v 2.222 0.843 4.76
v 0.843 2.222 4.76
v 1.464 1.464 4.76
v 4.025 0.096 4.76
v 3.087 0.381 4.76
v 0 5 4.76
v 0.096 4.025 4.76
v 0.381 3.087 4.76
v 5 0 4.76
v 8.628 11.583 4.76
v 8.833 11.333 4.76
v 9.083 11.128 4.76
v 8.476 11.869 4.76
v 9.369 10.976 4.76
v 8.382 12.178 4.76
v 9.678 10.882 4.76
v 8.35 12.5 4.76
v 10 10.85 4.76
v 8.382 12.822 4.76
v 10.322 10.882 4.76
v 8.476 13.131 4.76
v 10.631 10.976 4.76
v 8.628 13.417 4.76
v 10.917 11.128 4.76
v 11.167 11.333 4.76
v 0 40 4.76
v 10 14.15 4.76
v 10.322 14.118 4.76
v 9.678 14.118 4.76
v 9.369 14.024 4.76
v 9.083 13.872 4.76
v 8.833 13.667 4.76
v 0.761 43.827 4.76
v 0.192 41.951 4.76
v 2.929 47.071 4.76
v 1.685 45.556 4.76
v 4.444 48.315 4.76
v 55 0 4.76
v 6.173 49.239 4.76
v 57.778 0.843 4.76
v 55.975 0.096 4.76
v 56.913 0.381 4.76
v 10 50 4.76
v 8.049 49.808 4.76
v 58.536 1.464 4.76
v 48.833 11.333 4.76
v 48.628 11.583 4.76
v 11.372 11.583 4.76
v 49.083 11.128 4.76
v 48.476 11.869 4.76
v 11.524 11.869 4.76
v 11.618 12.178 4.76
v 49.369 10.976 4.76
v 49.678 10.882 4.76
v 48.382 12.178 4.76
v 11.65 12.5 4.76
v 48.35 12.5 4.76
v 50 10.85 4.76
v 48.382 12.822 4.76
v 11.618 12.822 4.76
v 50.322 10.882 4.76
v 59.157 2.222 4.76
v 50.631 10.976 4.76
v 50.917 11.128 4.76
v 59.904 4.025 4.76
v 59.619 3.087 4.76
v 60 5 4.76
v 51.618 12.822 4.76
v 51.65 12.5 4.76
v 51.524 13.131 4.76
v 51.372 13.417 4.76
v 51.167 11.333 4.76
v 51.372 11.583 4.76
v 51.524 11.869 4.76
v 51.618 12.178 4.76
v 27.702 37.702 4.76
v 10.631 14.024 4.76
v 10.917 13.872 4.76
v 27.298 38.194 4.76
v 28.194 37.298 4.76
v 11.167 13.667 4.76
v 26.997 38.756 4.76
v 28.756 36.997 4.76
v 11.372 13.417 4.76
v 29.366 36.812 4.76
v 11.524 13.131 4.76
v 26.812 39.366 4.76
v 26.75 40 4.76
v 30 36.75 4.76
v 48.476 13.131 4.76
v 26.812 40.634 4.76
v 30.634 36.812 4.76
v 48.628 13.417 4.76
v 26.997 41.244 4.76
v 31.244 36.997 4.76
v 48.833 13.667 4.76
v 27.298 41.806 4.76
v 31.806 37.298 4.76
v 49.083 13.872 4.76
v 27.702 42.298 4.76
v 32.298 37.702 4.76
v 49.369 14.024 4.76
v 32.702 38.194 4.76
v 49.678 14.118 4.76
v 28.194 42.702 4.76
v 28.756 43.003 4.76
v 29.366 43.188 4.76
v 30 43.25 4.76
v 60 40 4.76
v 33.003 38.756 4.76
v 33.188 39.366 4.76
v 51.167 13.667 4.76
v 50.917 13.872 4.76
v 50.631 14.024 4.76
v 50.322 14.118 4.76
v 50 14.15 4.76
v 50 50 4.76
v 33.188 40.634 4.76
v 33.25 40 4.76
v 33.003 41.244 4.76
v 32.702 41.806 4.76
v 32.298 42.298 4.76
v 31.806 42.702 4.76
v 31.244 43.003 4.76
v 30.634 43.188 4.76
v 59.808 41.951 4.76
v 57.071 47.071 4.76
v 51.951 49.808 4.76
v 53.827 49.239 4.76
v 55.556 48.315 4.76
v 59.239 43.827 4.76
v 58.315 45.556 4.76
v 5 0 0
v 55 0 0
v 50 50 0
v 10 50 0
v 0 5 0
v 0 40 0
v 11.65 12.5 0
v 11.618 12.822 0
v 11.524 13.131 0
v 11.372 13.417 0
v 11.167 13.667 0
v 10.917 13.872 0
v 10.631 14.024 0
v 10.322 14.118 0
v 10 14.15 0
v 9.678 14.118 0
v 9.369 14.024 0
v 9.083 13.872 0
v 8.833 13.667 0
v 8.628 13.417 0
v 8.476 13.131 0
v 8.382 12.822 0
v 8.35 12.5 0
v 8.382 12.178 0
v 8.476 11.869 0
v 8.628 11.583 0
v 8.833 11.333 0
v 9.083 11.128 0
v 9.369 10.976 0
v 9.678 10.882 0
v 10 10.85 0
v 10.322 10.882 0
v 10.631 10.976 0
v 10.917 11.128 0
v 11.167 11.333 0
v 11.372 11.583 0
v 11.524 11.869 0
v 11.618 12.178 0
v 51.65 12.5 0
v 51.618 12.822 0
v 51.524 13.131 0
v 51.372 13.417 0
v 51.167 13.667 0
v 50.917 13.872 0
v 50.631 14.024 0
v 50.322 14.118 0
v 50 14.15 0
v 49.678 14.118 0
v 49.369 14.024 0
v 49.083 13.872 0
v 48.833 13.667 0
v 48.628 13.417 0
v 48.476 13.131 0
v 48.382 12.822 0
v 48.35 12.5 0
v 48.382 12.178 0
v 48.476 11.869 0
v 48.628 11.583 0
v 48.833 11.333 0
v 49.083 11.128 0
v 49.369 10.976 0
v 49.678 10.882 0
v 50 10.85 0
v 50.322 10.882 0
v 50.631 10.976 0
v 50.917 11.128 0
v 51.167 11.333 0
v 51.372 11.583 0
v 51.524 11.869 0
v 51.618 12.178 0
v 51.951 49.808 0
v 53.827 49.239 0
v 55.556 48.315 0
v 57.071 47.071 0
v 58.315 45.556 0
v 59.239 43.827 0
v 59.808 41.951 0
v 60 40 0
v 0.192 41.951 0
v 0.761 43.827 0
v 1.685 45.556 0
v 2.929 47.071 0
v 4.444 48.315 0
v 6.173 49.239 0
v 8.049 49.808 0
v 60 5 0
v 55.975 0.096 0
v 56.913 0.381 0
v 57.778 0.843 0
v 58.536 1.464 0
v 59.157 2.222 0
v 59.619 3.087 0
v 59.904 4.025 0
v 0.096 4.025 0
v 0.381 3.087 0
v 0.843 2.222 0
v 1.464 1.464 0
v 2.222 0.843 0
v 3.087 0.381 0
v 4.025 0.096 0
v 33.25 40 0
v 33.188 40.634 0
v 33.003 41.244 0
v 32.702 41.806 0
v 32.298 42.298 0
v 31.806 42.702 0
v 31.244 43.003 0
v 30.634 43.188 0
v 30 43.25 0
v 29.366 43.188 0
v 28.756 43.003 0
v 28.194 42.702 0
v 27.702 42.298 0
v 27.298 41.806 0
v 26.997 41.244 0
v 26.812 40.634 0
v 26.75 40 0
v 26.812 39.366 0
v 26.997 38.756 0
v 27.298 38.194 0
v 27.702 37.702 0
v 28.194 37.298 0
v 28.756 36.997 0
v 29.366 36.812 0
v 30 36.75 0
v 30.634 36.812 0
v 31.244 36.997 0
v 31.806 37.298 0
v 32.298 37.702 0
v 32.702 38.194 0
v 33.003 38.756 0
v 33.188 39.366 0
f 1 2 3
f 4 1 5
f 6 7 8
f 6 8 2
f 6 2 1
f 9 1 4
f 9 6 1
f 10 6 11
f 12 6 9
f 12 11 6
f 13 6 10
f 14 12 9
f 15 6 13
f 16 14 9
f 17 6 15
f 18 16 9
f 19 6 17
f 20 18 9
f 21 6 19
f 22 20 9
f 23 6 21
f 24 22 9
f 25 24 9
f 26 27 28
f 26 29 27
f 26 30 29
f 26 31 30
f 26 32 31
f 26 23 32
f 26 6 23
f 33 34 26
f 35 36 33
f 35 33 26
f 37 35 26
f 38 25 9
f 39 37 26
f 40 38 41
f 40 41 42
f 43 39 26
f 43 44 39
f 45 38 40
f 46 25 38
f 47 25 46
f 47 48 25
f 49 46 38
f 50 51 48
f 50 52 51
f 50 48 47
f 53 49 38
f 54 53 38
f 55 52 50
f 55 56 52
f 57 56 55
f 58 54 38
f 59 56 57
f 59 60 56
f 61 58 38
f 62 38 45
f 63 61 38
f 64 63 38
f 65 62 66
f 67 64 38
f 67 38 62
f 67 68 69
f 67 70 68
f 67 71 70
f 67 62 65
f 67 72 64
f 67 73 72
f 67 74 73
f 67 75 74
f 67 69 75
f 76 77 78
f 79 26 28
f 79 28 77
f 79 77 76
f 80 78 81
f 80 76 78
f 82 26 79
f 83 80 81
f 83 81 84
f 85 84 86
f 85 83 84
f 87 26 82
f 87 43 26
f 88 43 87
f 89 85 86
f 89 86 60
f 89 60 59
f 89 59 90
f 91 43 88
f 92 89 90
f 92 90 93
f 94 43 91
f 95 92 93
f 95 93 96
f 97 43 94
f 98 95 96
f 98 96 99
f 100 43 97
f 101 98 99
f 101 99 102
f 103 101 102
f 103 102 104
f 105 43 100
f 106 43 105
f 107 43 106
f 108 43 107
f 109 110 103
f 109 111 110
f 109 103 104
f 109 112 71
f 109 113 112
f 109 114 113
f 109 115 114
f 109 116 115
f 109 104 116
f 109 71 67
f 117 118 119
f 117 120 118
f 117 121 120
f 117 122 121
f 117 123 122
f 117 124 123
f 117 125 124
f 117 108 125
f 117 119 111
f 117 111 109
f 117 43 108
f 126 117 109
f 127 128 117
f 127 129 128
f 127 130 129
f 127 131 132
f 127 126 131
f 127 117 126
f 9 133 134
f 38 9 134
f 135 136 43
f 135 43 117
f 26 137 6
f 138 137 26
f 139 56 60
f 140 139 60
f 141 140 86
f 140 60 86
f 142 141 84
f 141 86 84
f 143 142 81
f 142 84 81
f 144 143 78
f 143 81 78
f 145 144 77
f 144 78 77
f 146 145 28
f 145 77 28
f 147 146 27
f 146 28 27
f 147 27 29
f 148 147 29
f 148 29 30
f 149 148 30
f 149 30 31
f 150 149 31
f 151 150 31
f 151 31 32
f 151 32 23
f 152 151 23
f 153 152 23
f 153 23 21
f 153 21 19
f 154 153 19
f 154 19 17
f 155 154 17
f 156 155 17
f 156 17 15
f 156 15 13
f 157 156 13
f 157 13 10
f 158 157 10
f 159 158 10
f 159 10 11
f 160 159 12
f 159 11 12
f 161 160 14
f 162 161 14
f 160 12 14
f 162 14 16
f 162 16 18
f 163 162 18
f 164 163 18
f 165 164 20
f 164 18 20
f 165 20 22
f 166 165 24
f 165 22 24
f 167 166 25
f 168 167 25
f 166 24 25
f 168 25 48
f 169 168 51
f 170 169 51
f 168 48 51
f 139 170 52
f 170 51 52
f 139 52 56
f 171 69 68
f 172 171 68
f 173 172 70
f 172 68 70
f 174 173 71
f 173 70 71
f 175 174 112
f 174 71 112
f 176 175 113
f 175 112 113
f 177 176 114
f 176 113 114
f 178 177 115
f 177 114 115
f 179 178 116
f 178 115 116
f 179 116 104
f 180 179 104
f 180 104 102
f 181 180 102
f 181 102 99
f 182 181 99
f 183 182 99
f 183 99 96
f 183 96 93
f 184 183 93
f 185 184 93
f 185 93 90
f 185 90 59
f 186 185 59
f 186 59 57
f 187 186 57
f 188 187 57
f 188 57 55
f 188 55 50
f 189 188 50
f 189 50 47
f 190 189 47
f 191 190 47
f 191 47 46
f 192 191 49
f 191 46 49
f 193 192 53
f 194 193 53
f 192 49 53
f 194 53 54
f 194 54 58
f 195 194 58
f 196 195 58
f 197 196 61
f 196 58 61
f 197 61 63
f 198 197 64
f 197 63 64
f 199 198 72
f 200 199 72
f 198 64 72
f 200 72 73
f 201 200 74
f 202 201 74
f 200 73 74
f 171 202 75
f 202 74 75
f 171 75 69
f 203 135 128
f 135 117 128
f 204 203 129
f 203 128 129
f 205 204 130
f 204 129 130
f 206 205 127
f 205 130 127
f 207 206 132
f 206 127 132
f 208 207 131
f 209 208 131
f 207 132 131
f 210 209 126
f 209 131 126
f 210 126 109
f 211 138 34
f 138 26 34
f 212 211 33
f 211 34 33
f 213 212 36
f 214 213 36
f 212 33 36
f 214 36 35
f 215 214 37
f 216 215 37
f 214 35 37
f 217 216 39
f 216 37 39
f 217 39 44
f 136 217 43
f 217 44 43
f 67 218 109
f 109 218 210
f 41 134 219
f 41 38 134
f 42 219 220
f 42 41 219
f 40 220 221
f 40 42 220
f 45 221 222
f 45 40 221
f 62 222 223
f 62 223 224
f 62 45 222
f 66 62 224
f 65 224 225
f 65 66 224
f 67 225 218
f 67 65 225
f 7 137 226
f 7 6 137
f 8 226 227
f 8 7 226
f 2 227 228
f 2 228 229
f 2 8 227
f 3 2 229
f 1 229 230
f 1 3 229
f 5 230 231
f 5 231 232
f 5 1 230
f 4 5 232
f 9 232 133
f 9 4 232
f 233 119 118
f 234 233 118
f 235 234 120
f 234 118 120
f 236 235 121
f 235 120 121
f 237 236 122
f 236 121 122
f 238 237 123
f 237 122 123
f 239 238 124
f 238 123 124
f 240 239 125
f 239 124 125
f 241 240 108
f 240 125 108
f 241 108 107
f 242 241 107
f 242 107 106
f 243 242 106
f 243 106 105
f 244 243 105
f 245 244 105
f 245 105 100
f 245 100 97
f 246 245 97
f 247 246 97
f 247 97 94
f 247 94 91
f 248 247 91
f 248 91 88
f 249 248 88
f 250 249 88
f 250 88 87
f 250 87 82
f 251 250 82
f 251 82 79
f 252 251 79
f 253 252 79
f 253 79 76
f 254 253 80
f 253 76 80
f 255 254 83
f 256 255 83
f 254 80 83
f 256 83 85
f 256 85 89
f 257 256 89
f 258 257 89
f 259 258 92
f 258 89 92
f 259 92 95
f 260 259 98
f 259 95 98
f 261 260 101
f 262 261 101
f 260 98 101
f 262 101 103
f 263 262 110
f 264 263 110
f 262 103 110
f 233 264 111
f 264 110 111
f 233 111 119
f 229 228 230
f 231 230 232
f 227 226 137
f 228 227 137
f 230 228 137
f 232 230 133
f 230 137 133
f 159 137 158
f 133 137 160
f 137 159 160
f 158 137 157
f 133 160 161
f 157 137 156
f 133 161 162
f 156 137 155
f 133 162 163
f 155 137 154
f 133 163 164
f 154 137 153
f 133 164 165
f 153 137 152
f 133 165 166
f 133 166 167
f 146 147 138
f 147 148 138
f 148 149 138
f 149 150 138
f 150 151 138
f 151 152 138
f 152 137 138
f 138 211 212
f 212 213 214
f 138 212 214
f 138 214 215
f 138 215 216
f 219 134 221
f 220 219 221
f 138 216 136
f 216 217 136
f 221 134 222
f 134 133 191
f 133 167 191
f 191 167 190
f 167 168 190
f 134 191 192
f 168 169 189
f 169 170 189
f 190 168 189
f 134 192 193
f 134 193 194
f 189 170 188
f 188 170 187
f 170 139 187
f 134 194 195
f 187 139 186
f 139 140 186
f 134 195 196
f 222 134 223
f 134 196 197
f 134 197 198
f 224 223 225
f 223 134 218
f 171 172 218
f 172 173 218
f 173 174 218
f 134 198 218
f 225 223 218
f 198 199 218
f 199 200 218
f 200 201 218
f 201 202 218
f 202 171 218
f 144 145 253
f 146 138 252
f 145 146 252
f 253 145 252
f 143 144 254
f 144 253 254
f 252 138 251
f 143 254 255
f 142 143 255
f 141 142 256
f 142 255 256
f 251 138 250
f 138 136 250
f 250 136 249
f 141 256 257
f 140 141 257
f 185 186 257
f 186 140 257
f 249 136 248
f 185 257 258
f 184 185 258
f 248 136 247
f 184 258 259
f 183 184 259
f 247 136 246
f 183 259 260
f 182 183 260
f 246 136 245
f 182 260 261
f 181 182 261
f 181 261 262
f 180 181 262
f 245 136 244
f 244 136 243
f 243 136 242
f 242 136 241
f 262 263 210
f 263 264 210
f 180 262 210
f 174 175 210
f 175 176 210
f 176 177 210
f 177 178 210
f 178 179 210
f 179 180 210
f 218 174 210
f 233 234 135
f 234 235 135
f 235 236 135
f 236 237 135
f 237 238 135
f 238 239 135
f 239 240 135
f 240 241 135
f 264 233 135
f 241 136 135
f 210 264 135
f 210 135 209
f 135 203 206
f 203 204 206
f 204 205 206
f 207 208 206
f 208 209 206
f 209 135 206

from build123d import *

# Parameters (mm, degrees)
SKETCH1_W           = 60
SKETCH1_H           = 50
BOSS_EXTRUDE1_DEPTH = 4.76
SKETCH2_R           = 1.65
SKETCH2_R_2         = 3.25
CUT_EXTRUDE1_DEPTH  = 5.76
FILLET1_R           = 10
FILLET2_R           = 5


with BuildPart() as part:
    # Sketch1 → Boss-Extrude1 (new body)
    with BuildSketch(Plane.XY):
        with Locations((30, 25)):
            Rectangle(SKETCH1_W, SKETCH1_H)
    extrude(amount=BOSS_EXTRUDE1_DEPTH)

    # Sketch2 → Cut-Extrude1 (cut, through all)
    with BuildSketch(Plane.XY.offset(4.76)):
        with Locations((10, 12.5)):
            Circle(SKETCH2_R)
        with Locations((50, 12.5)):
            Circle(SKETCH2_R)
        with Locations((30, 40)):
            Circle(SKETCH2_R_2)
    extrude(amount=-CUT_EXTRUDE1_DEPTH, mode=Mode.SUBTRACT)

    # Fillet1
    fillet1_edges = [part.edges().sort_by_distance(p)[0] for p in [
        (0, 50, 2.38),
        (60, 50, 2.38),
    ]]
    fillet(fillet1_edges, radius=FILLET1_R)

    # Fillet2
    fillet2_edges = [part.edges().sort_by_distance(p)[0] for p in [
        (60, 0, 2.38),
        (0, 0, 2.38),
    ]]
    fillet(fillet2_edges, radius=FILLET2_R)


solid = part.part
